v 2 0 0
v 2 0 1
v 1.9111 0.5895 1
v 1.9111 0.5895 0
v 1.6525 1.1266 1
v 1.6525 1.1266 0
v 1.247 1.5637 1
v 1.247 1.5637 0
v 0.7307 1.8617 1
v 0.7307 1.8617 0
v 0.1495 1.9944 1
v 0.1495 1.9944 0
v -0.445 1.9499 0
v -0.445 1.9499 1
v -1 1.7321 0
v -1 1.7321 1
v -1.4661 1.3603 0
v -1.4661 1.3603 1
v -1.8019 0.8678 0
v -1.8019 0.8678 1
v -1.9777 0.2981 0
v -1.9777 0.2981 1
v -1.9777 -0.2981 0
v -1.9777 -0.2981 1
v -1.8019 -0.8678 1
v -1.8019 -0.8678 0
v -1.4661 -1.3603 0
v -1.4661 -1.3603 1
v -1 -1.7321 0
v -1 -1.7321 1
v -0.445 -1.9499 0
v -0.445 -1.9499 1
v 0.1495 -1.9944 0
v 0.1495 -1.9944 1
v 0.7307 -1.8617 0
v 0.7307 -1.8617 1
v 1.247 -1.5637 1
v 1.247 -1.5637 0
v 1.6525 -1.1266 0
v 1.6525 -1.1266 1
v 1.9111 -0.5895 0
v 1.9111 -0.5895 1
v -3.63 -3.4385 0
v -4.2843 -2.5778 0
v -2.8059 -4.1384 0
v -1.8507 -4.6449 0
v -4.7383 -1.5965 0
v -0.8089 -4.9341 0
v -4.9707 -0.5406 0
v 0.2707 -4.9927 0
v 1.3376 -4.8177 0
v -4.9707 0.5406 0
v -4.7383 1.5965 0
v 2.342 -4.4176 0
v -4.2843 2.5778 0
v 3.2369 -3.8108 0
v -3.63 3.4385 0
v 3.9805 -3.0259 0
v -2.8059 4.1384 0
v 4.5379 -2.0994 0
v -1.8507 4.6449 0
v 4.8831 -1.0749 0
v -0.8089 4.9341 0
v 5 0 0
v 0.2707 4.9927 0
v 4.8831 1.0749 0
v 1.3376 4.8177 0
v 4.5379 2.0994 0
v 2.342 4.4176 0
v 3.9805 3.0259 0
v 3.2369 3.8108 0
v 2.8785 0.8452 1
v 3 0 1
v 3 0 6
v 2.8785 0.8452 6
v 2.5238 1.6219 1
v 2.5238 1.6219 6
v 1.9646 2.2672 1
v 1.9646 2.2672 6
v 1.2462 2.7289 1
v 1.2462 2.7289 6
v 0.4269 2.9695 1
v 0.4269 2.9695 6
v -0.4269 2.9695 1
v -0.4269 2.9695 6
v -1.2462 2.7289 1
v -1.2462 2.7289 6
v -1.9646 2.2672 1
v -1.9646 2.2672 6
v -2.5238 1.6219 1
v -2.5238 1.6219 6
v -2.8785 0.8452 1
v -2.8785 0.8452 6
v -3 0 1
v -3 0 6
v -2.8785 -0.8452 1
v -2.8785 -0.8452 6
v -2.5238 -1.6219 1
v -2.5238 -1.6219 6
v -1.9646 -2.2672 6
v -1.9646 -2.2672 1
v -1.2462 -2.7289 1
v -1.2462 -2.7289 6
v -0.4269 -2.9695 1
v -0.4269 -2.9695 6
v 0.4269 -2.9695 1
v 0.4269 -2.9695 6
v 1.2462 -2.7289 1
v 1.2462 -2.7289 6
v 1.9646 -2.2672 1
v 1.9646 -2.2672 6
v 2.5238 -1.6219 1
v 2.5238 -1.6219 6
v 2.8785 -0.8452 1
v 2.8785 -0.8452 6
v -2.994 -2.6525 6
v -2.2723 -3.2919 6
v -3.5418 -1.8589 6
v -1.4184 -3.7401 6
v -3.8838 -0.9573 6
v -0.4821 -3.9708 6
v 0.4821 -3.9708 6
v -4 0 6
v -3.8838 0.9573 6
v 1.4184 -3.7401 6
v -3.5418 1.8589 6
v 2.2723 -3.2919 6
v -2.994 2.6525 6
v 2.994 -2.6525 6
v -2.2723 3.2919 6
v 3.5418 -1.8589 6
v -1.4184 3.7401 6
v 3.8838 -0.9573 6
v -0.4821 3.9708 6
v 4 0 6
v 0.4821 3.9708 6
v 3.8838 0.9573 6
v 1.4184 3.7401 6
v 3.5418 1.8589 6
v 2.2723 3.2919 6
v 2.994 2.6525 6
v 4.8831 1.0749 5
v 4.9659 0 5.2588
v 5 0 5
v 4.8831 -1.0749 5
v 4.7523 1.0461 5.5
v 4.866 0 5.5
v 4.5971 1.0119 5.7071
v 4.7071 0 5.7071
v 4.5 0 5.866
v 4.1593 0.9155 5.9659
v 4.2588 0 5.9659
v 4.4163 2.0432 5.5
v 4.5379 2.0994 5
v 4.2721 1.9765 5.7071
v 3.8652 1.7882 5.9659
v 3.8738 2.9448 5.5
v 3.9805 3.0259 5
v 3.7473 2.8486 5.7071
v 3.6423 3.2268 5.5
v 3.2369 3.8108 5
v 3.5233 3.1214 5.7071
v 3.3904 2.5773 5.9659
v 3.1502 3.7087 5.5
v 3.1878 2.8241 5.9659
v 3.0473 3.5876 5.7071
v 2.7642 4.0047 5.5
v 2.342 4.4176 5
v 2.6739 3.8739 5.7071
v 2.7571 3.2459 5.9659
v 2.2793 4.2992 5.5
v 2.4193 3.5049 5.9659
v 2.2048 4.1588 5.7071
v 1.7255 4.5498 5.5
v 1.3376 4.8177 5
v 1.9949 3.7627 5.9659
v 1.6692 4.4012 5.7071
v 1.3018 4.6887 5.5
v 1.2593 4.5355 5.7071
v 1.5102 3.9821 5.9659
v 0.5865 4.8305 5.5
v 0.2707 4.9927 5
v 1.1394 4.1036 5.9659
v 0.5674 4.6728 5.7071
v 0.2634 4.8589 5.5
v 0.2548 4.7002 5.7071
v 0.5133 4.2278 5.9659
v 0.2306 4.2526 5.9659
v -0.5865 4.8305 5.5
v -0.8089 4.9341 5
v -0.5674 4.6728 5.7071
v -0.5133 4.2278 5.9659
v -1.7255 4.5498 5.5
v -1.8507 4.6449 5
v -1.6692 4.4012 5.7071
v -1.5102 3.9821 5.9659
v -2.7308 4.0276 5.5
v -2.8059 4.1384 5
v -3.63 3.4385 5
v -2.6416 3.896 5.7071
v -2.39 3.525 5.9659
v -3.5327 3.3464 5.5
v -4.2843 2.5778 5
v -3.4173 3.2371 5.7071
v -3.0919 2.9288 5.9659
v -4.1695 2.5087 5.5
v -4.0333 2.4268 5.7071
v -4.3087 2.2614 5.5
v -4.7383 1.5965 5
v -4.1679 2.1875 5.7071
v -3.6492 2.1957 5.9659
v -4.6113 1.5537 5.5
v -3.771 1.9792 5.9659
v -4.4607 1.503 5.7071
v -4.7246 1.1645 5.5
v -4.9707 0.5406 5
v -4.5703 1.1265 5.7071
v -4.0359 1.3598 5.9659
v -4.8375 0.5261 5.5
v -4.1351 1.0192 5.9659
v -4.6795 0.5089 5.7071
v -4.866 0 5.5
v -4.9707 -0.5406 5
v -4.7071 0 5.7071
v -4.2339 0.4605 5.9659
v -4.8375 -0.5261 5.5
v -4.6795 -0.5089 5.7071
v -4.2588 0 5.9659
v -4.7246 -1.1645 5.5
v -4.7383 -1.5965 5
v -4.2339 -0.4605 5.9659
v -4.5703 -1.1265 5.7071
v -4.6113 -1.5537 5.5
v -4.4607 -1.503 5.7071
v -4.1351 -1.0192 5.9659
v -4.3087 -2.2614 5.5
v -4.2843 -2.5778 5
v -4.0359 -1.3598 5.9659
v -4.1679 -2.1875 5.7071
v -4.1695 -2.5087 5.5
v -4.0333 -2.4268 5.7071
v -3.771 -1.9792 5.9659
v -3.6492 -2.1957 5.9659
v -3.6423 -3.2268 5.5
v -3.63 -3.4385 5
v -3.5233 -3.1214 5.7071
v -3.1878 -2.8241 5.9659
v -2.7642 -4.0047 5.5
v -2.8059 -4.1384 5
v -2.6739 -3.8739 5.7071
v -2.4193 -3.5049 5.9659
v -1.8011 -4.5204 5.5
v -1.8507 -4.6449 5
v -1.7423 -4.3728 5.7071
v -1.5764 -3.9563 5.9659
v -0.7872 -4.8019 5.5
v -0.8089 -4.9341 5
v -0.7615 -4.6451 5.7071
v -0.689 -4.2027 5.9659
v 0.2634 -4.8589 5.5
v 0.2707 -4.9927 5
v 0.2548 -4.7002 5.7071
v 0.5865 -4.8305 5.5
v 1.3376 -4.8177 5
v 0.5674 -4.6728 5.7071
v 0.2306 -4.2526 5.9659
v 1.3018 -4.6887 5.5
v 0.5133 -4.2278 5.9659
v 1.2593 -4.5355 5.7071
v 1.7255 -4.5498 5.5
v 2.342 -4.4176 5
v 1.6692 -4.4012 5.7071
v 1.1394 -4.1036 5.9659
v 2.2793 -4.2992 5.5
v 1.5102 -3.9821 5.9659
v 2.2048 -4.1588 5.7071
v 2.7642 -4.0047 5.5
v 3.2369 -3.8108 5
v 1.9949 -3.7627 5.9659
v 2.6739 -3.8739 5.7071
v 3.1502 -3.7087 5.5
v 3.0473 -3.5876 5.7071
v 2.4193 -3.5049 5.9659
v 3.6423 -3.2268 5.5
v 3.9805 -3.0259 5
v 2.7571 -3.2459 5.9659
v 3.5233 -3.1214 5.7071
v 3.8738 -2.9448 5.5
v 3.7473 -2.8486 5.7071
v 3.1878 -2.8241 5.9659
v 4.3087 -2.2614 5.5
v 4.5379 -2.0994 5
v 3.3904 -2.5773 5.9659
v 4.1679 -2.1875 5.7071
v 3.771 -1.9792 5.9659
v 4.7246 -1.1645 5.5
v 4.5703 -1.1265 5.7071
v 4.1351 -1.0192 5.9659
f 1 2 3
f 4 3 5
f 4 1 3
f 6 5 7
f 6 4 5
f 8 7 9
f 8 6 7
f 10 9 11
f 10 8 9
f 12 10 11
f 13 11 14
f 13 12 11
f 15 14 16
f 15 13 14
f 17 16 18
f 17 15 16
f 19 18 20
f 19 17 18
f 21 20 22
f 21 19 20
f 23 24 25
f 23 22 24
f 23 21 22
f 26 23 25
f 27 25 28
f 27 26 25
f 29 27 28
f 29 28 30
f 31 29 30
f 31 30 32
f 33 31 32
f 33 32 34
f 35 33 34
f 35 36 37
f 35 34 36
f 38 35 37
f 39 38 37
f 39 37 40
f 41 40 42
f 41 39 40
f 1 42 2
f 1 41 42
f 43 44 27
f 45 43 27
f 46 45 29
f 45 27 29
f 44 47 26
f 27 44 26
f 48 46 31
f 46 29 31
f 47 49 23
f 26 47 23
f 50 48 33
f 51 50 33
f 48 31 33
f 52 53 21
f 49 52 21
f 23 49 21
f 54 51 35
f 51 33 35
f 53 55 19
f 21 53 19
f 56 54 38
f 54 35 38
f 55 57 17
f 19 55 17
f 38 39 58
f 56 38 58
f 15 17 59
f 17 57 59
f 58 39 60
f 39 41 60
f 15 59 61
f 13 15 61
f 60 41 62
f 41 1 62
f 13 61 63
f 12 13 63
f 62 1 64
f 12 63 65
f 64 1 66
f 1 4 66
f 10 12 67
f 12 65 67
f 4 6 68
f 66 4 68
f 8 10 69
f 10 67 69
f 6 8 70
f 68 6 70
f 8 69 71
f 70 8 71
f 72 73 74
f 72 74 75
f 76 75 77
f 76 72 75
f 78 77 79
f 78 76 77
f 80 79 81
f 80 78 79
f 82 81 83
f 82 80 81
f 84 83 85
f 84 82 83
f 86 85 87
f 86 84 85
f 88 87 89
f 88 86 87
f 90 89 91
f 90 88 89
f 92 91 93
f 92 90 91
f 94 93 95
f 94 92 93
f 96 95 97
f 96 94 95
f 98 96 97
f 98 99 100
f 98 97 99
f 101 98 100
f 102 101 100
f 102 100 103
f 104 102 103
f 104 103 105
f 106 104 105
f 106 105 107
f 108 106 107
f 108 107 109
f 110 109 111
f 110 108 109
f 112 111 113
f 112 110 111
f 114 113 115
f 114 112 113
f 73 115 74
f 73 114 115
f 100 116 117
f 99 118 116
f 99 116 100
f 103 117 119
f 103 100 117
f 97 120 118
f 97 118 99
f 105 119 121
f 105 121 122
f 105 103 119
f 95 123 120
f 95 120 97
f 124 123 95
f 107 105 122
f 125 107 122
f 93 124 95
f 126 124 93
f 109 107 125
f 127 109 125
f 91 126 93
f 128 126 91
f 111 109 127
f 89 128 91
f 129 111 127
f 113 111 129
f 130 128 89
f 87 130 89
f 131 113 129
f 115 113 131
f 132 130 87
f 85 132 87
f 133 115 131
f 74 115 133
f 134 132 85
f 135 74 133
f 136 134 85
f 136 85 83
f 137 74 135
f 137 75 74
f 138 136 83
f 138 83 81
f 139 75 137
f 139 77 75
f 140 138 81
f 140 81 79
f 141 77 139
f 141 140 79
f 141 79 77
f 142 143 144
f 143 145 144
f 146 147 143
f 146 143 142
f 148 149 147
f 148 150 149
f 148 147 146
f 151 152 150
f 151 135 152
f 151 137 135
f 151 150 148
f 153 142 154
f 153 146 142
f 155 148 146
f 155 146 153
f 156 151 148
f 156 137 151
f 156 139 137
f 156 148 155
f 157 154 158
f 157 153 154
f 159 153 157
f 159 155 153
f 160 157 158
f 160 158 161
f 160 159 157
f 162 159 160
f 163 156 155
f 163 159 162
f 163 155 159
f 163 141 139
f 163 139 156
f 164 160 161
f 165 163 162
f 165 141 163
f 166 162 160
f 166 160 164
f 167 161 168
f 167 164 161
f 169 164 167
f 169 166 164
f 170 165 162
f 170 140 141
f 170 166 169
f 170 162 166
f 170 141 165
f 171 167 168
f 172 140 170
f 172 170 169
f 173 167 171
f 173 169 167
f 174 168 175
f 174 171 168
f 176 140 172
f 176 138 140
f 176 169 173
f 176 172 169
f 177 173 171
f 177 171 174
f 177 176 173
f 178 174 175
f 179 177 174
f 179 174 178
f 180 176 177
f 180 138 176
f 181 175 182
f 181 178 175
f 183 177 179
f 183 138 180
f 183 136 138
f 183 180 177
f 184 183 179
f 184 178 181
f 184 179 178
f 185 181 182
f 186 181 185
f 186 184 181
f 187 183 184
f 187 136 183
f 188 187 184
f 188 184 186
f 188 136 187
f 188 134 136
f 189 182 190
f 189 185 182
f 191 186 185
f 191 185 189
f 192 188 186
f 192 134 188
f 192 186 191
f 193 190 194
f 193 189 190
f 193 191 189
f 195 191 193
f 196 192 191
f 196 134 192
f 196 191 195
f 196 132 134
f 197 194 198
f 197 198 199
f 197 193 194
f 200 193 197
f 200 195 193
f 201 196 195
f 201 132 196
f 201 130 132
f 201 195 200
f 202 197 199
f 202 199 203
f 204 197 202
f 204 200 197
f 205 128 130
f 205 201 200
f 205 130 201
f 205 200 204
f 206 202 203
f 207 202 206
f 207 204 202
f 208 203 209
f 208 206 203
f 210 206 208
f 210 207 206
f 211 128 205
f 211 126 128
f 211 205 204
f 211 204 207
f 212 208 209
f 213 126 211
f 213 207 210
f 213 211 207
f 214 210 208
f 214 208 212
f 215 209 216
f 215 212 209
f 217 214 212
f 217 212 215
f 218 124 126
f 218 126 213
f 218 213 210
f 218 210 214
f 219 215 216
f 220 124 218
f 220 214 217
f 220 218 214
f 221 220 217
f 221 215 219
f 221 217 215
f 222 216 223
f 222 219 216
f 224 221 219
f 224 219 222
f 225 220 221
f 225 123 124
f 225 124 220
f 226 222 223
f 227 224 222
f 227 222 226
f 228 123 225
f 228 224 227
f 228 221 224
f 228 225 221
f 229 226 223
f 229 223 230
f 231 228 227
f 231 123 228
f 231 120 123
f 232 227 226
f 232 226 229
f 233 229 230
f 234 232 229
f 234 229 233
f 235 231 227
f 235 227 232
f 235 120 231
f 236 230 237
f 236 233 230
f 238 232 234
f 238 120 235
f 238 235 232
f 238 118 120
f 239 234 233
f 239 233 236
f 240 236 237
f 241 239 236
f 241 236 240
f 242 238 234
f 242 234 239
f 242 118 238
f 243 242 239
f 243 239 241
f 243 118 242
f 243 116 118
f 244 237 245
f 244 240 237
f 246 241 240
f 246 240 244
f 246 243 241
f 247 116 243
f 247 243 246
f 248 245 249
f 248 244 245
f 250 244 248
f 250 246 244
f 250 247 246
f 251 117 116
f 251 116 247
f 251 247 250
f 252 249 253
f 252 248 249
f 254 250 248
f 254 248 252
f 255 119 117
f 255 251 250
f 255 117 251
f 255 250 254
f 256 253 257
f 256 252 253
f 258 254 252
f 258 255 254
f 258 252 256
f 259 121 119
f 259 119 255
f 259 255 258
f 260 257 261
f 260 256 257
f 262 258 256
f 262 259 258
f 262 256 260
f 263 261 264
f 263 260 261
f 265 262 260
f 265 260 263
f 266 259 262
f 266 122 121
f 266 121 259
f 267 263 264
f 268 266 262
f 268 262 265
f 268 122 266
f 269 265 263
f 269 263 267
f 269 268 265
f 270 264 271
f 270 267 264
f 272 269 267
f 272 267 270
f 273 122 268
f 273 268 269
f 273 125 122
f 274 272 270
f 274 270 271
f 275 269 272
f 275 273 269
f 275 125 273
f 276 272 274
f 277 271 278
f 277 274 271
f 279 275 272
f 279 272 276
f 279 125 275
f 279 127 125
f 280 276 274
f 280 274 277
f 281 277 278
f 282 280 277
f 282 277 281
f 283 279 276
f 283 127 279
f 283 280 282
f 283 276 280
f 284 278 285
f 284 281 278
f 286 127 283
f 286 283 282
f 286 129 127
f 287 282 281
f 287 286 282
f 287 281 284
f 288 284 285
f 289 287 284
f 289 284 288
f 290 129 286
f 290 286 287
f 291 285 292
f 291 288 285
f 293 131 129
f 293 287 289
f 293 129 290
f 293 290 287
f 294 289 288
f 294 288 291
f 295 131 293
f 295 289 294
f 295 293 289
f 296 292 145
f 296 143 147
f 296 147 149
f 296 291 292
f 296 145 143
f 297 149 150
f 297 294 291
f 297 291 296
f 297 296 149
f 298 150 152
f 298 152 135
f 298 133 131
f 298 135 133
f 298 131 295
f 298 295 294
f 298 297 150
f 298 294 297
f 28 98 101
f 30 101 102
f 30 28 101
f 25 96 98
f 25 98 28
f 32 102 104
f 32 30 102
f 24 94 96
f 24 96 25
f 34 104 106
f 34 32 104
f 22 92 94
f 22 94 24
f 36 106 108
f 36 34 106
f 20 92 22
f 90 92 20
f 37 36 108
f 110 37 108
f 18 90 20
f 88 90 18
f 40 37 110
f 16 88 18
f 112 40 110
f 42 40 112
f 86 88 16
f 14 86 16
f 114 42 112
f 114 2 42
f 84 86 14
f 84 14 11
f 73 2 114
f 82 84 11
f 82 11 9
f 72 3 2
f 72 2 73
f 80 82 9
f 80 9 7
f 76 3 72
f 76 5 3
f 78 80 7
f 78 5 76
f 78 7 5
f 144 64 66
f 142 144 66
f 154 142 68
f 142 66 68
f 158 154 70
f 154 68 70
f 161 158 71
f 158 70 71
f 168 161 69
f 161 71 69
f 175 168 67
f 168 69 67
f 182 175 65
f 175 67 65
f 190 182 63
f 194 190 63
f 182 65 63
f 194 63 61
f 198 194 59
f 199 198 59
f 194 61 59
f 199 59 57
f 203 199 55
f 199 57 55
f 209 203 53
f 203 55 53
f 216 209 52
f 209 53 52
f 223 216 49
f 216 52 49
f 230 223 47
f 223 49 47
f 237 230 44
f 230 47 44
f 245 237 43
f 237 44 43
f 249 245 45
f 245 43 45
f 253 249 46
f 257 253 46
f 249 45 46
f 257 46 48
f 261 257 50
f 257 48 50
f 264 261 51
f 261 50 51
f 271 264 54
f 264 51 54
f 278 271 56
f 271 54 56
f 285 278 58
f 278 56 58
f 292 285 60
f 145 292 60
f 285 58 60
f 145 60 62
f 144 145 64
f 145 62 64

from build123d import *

# Parameters (mm, degrees)
CYLINDER032_R     = 2
CYLINDER032_DEPTH = 10
CYLINDER030_R     = 3
CYLINDER030_DEPTH = 10
CYLINDER031_R     = 5
CYLINDER031_DEPTH = 6
FILLET008_R       = 1


with BuildPart() as hole_cylinder:
    # Cylinder032 → Cylinder032 (new body)
    with BuildSketch(Plane.XY):
        Circle(CYLINDER032_R)
    extrude(amount=CYLINDER032_DEPTH)


with BuildPart() as fusion010:
    # Cylinder030 → Cylinder030 (new body)
    with BuildSketch(Plane.XY.offset(1)):
        Circle(CYLINDER030_R)
    extrude(amount=CYLINDER030_DEPTH)

    # Fusion010: union hole cylinder
    add(hole_cylinder.part)


with BuildPart() as fillet008:
    # Cylinder031 → Cylinder031 (new body)
    with BuildSketch(Plane.XY):
        Circle(CYLINDER031_R)
    extrude(amount=CYLINDER031_DEPTH)

    # Cut012: cut Fusion010
    add(fusion010.part, mode=Mode.SUBTRACT)

    # Fillet008
    fillet008_edges = [fillet008.edges().sort_by_distance(p)[0] for p in [
        (-5, 0, 6),
    ]]
    fillet(fillet008_edges, radius=FILLET008_R)


solid = fillet008.part
